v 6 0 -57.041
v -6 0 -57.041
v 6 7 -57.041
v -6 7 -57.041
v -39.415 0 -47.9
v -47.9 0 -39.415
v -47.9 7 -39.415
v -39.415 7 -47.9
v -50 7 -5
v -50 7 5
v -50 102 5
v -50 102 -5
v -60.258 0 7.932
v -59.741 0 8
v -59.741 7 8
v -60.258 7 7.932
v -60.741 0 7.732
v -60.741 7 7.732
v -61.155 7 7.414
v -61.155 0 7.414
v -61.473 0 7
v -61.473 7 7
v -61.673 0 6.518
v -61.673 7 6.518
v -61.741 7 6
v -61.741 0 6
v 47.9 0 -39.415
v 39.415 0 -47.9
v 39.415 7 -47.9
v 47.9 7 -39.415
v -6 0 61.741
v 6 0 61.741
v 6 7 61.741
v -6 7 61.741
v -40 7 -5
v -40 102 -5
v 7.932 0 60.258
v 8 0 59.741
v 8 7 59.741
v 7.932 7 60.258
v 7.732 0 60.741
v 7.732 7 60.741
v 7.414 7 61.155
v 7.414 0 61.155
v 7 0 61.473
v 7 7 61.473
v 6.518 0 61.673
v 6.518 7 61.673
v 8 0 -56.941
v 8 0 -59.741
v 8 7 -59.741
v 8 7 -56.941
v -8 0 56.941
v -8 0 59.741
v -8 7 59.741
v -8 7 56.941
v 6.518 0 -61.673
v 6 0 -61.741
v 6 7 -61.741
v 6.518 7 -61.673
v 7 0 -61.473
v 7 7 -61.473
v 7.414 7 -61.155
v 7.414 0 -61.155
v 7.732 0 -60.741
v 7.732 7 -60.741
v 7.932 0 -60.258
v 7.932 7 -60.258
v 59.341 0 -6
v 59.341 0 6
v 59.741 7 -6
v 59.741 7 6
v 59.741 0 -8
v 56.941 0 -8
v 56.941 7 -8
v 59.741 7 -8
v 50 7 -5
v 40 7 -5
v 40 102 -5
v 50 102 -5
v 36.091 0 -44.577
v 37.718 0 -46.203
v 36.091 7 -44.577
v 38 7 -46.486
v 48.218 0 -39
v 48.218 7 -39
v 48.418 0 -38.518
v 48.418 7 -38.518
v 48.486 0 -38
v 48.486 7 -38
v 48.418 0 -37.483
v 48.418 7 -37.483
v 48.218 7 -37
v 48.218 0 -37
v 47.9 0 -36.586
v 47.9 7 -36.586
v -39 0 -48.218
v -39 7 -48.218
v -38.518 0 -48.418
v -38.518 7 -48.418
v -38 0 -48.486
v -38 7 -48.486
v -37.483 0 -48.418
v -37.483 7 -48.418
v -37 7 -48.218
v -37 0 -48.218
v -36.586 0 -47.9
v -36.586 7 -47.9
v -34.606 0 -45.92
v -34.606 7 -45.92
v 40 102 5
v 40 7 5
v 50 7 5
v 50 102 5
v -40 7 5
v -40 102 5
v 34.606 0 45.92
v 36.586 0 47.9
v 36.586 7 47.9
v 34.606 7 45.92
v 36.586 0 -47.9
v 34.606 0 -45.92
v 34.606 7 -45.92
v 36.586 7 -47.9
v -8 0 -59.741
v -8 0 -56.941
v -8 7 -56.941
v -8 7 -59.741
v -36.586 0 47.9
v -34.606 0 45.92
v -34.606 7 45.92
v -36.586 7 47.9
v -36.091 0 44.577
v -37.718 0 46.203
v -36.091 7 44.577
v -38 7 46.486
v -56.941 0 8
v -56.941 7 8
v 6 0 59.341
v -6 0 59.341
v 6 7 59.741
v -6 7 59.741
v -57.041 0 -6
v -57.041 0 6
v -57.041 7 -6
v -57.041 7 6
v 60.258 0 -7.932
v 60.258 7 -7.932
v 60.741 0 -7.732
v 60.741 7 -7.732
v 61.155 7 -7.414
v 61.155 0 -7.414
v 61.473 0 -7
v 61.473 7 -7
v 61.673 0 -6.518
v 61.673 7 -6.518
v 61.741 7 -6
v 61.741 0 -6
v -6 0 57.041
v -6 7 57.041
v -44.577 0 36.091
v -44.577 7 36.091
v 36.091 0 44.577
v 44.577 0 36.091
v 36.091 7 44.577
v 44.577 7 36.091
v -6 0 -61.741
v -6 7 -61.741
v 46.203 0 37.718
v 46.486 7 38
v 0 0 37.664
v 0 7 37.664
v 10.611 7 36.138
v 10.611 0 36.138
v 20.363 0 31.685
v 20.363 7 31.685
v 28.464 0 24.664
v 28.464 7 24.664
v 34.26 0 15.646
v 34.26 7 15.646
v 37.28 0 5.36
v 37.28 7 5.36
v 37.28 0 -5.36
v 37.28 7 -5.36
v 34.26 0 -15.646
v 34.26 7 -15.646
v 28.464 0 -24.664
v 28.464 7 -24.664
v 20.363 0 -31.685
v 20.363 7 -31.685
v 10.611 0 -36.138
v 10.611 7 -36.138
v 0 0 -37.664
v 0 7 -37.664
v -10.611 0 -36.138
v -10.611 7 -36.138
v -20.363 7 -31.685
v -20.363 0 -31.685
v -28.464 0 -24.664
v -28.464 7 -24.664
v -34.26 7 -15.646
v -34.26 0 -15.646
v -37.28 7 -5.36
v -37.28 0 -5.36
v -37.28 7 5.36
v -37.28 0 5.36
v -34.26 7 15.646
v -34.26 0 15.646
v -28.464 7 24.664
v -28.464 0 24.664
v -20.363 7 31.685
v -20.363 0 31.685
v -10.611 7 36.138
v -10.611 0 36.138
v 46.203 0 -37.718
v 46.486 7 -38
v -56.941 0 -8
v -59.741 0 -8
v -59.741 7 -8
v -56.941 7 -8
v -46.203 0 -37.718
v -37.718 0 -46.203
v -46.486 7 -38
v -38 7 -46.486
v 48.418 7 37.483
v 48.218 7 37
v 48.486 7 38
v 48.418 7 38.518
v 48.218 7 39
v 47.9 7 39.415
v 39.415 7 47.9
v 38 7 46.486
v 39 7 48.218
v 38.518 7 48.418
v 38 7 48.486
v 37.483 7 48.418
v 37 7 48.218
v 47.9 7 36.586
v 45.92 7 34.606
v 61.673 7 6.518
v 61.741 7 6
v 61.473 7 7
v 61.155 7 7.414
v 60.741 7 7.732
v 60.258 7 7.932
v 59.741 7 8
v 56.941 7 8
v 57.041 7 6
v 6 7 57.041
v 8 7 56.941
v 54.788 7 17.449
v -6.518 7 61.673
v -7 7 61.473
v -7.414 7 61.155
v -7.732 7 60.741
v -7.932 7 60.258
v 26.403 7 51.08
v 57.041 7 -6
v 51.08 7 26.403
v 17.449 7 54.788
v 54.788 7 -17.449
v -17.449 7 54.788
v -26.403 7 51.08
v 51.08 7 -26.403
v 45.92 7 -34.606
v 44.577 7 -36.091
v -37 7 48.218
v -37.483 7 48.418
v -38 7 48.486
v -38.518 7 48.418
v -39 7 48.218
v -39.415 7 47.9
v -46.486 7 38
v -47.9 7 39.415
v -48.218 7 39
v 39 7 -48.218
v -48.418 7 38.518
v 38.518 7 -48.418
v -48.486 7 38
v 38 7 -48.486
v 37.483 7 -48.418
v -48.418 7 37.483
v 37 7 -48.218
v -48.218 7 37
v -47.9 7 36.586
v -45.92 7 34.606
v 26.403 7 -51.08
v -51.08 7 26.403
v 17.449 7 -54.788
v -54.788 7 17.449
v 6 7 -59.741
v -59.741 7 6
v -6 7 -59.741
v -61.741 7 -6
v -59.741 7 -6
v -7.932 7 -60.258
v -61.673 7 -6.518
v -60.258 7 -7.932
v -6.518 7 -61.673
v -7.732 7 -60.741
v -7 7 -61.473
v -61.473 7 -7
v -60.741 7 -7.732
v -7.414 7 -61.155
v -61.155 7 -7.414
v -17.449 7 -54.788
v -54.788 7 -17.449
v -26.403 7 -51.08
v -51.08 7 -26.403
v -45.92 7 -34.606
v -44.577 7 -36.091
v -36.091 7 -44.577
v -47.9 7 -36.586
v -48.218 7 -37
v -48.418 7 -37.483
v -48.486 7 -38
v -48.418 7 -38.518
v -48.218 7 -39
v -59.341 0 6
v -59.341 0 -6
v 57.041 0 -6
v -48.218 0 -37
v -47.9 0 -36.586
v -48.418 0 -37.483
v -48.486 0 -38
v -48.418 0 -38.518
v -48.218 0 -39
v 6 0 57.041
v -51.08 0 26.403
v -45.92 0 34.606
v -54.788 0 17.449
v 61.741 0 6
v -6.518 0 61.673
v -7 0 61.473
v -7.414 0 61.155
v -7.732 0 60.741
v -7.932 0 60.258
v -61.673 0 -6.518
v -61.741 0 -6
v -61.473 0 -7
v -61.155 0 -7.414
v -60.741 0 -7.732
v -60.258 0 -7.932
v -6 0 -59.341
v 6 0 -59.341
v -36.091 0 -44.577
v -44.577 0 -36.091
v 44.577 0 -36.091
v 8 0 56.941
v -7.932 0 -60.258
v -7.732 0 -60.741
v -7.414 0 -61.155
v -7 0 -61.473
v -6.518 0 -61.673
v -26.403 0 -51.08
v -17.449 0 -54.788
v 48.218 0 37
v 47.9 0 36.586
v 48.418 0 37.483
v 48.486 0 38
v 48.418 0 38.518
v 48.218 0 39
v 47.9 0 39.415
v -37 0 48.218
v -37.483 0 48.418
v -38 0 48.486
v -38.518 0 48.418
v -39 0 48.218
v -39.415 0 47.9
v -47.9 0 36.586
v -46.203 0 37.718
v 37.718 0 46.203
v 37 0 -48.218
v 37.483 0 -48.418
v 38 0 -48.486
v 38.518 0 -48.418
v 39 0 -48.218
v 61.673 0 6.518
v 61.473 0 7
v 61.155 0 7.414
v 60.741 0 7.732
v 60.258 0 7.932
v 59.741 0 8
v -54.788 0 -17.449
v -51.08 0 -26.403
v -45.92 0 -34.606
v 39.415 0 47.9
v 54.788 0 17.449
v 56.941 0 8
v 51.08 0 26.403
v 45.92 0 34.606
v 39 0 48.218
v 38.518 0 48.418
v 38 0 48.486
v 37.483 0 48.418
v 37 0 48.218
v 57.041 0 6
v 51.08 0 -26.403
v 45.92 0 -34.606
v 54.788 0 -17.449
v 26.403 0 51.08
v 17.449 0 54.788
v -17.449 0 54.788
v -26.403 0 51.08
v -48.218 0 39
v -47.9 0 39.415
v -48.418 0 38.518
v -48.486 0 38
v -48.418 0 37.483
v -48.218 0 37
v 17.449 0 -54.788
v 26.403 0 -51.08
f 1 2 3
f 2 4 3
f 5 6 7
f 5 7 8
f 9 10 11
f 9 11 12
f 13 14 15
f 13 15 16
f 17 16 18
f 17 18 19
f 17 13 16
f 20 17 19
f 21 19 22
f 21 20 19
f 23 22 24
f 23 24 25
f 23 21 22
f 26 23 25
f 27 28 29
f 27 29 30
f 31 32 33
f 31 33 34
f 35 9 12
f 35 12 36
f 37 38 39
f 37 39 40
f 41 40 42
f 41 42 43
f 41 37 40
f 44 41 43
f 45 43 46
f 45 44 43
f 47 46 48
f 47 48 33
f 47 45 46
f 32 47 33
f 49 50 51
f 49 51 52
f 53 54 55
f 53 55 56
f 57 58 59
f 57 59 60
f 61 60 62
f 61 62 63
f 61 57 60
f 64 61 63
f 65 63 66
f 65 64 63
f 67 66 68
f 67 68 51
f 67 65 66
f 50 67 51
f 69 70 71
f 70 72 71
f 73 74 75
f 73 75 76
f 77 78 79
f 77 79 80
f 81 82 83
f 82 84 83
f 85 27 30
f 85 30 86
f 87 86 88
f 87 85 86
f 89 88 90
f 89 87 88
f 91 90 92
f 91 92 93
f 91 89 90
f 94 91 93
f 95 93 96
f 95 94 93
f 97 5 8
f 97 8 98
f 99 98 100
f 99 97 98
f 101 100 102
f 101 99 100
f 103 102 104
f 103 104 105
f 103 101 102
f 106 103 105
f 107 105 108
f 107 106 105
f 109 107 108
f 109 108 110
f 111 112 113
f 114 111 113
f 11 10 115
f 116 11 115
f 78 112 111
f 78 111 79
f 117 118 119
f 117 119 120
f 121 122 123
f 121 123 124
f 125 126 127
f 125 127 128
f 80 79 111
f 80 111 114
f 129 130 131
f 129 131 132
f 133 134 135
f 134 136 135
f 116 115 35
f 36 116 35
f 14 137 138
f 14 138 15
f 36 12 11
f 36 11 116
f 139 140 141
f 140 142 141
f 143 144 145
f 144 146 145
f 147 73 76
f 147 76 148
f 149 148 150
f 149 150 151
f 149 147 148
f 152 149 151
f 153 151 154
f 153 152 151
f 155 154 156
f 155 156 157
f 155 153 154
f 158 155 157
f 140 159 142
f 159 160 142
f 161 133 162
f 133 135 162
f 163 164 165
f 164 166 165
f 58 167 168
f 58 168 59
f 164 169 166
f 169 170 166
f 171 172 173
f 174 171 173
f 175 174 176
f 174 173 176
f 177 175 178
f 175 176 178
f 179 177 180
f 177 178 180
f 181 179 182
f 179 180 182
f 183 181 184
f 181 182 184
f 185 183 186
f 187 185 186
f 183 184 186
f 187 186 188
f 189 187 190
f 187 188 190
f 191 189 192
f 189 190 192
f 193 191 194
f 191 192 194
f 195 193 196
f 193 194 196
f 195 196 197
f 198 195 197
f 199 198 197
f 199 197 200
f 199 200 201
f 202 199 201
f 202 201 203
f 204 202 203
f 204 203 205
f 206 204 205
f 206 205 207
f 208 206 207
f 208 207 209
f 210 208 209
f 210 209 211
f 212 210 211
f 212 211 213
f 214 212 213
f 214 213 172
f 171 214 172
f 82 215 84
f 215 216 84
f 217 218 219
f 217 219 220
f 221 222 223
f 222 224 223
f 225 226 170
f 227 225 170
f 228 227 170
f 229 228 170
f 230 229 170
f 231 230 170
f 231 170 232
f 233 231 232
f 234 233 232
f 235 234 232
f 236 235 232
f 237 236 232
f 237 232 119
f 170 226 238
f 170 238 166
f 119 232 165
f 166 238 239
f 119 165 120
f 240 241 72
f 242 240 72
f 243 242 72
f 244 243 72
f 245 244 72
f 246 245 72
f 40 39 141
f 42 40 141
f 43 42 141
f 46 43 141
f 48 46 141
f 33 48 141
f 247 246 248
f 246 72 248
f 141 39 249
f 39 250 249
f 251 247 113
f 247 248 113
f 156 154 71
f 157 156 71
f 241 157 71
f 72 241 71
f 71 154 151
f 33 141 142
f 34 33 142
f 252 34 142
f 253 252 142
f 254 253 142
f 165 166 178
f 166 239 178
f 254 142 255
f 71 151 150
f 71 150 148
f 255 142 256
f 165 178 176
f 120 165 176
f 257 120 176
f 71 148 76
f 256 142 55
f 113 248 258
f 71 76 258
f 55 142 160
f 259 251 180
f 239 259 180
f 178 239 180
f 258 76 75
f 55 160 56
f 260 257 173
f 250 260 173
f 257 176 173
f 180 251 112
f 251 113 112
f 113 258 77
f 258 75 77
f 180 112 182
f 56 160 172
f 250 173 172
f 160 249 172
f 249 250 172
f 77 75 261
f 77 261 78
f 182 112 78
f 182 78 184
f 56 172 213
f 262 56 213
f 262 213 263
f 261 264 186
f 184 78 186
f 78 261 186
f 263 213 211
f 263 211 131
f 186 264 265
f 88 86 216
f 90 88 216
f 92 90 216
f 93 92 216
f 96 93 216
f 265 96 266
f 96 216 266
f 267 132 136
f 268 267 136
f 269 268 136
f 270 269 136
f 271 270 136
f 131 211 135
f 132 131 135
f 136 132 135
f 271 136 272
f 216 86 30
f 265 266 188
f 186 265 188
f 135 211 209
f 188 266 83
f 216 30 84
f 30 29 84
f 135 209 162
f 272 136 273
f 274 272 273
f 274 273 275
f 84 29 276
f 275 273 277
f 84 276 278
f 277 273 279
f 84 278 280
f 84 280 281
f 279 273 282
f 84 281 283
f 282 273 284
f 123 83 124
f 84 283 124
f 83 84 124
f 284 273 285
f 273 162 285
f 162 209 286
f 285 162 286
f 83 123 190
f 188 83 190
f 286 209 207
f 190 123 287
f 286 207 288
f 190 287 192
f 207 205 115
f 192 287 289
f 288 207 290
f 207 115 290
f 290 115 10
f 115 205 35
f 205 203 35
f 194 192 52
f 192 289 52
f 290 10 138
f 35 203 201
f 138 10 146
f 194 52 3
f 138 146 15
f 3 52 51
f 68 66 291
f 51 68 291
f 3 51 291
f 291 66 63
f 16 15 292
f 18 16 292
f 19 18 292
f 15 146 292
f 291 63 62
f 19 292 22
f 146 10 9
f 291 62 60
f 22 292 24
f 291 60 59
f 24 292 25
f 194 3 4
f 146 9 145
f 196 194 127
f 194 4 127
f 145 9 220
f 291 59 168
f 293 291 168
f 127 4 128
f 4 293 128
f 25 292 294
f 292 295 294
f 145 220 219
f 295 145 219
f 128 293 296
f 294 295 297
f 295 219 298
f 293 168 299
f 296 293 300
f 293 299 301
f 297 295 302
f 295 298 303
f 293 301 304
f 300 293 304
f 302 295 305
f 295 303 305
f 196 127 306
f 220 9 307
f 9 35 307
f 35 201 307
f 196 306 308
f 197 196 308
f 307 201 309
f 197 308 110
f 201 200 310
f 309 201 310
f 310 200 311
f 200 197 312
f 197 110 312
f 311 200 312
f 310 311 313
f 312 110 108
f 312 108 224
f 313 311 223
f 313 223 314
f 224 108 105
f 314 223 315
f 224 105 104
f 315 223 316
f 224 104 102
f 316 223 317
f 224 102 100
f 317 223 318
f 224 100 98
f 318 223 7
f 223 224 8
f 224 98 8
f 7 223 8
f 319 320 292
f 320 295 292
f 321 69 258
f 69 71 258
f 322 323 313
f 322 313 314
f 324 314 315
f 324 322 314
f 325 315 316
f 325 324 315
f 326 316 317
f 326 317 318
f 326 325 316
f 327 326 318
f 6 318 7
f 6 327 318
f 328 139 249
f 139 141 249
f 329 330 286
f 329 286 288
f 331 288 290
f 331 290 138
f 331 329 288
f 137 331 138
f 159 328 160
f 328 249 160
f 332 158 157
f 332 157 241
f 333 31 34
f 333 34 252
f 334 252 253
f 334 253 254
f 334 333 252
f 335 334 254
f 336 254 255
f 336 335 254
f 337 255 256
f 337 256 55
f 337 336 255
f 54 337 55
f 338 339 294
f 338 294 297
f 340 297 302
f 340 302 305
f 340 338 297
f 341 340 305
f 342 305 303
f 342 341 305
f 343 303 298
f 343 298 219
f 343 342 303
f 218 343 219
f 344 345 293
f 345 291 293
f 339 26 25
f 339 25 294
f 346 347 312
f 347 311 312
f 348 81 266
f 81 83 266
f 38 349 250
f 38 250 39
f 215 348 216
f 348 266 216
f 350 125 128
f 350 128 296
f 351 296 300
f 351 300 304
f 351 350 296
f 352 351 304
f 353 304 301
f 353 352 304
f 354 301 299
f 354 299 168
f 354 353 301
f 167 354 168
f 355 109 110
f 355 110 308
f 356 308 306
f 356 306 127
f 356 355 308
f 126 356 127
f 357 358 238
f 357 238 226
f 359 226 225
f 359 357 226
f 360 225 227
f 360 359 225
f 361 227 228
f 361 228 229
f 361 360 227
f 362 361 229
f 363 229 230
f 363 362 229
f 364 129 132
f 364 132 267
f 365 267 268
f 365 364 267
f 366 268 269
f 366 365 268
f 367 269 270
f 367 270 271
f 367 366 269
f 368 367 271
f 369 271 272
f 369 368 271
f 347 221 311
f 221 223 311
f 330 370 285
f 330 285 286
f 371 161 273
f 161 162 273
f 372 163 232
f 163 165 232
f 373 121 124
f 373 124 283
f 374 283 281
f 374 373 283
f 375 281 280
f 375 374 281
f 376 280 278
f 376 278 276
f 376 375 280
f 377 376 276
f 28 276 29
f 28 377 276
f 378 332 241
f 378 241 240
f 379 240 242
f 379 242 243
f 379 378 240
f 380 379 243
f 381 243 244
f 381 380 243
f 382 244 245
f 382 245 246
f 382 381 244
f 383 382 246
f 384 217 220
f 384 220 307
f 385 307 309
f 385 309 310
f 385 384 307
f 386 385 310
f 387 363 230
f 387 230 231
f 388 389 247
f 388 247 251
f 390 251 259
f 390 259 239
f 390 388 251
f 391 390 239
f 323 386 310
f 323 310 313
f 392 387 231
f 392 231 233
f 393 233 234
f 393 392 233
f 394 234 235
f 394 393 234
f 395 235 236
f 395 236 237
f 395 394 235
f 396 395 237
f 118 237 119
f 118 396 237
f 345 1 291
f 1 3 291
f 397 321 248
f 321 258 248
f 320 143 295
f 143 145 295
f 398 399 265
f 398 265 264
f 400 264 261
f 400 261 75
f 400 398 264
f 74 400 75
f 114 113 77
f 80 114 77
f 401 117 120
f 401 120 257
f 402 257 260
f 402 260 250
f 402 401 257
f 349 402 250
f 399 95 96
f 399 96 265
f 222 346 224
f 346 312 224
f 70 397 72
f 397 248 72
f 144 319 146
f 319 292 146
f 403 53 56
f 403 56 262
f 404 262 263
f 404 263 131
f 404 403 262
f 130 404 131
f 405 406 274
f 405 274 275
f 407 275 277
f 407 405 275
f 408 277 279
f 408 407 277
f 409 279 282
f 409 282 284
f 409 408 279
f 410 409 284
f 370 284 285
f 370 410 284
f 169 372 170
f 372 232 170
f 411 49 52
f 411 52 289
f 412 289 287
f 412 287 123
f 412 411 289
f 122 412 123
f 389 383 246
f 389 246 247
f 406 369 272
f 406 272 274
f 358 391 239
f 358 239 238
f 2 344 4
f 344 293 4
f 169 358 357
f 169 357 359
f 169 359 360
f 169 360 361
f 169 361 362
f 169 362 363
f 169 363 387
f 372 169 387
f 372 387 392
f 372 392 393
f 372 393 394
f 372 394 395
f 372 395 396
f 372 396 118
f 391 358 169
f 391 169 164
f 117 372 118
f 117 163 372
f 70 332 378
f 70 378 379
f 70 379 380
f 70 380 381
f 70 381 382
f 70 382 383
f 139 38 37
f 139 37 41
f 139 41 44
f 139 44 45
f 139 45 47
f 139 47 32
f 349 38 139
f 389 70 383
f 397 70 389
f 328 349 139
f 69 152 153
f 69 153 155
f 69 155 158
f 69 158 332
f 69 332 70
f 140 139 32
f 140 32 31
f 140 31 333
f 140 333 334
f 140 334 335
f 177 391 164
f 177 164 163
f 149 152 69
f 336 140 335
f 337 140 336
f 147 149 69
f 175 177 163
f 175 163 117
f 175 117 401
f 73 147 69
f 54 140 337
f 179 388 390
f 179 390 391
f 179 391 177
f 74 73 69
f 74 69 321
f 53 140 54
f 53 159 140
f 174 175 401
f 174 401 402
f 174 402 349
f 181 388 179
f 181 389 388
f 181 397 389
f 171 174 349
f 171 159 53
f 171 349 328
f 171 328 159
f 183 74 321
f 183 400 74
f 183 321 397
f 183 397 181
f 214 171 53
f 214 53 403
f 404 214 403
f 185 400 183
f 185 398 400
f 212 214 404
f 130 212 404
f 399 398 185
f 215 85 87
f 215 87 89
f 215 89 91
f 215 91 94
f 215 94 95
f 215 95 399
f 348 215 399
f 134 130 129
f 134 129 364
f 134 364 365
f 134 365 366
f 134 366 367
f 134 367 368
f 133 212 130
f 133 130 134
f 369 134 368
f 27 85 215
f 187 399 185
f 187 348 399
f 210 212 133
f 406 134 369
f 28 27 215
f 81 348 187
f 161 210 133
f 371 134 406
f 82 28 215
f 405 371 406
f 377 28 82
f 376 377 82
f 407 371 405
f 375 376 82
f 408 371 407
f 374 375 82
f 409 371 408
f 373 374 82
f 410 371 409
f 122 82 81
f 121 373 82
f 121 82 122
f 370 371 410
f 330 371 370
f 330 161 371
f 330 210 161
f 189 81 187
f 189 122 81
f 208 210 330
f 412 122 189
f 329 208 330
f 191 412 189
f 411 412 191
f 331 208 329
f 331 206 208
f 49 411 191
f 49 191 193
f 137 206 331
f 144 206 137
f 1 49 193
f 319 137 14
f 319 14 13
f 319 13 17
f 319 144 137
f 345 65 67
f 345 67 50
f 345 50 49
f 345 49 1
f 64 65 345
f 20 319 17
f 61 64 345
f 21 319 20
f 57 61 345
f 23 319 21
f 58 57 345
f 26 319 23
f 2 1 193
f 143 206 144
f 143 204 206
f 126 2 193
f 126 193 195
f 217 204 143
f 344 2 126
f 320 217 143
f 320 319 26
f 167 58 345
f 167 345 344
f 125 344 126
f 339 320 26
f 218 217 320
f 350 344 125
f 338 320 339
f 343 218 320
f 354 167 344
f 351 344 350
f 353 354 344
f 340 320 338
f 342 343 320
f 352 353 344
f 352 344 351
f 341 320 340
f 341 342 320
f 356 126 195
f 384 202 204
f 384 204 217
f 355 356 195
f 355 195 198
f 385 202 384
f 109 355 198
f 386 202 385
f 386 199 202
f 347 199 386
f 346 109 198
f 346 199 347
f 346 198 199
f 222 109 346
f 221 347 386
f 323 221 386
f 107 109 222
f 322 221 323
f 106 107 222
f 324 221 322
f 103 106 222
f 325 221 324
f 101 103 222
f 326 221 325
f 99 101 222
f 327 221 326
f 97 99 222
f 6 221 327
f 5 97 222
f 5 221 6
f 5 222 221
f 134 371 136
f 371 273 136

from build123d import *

# Parameters (mm, degrees)
BOSS_EXTRUDE1_DEPTH = 7
SKETCH2_W           = 10
SKETCH2_H           = 10
BOSS_EXTRUDE2_DEPTH = 95
SKETCH3_R           = 37.663730654
CUT_EXTRUDE1_DEPTH  = 130.030393965
CIRPATTERN1_COUNT   = 8


with BuildPart() as part:
    # Sketch1 → Boss-Extrude1 (new body)
    with BuildSketch(Plane(origin=(0, 0, 0), x_dir=(1, 0, 0), z_dir=(0, 1, 0))):
        with BuildLine():
            Line((-8, 56.940758688), (-8, 59.740758688))
            ThreePointArc((-8, 59.740758688), (-7.414213562, 61.154972251), (-6, 61.740758688))
            Line((-6, 61.740758688), (6, 61.740758688))
            ThreePointArc((6, 61.740758688), (7.414213562, 61.154972251), (8, 59.740758688))
            Line((8, 59.740758688), (8, 56.940758688))
            ThreePointArc((8, 56.940758688), (22.004297361, 53.123073119), (34.606342345, 45.920050844))
            Line((34.606342345, 45.920050844), (36.586241332, 47.899949831))
            ThreePointArc((36.586241332, 47.899949831), (38.000454895, 48.485736269), (39.414668457, 47.899949831))
            Line((39.414668457, 47.899949831), (47.899949831, 39.414668457))
            ThreePointArc((47.899949831, 39.414668457), (48.485736269, 38.000454895), (47.899949831, 36.586241332))
            Line((47.899949831, 36.586241332), (45.920050844, 34.606342345))
            ThreePointArc((45.920050844, 34.606342345), (53.123073119, 22.004297361), (56.940758688, 8))
            Line((56.940758688, 8), (59.740758688, 8))
            ThreePointArc((59.740758688, 8), (61.154972251, 7.414213562), (61.740758688, 6))
            Line((61.740758688, 6), (61.740758688, -6))
            ThreePointArc((61.740758688, -6), (61.154972251, -7.414213562), (59.740758688, -8))
            Line((59.740758688, -8), (56.940758688, -8))
            ThreePointArc((56.940758688, -8), (53.123073119, -22.004297361), (45.920050844, -34.606342345))
            Line((45.920050844, -34.606342345), (47.899949831, -36.586241332))
            ThreePointArc((47.899949831, -36.586241332), (48.485736269, -38.000454895), (47.899949831, -39.414668457))
            Line((47.899949831, -39.414668457), (39.414668457, -47.899949831))
            ThreePointArc((39.414668457, -47.899949831), (38.000454895, -48.485736269), (36.586241332, -47.899949831))
            Line((36.586241332, -47.899949831), (34.606342345, -45.920050844))
            ThreePointArc((34.606342345, -45.920050844), (22.004297361, -53.123073119), (8, -56.940758688))
            Line((8, -56.940758688), (8, -59.740758688))
            ThreePointArc((8, -59.740758688), (7.414213562, -61.154972251), (6, -61.740758688))
            Line((6, -61.740758688), (-6, -61.740758688))
            ThreePointArc((-6, -61.740758688), (-7.414213562, -61.154972251), (-8, -59.740758688))
            Line((-8, -59.740758688), (-8, -56.940758688))
            ThreePointArc((-8, -56.940758688), (-22.004297361, -53.123073119), (-34.606342345, -45.920050844))
            Line((-34.606342345, -45.920050844), (-36.586241332, -47.899949831))
            ThreePointArc((-36.586241332, -47.899949831), (-38.000454895, -48.485736269), (-39.414668457, -47.899949831))
            Line((-39.414668457, -47.899949831), (-47.899949831, -39.414668457))
            ThreePointArc((-47.899949831, -39.414668457), (-48.485736269, -38.000454895), (-47.899949831, -36.586241332))
            Line((-47.899949831, -36.586241332), (-45.920050844, -34.606342345))
            ThreePointArc((-45.920050844, -34.606342345), (-53.123073119, -22.004297361), (-56.940758688, -8))
            Line((-56.940758688, -8), (-59.740758688, -8))
            ThreePointArc((-59.740758688, -8), (-61.154972251, -7.414213562), (-61.740758688, -6))
            Line((-61.740758688, -6), (-61.740758688, 6))
            ThreePointArc((-61.740758688, 6), (-61.154972251, 7.414213562), (-59.740758688, 8))
            Line((-59.740758688, 8), (-56.940758688, 8))
            ThreePointArc((-56.940758688, 8), (-53.123073119, 22.004297361), (-45.920050844, 34.606342345))
            Line((-45.920050844, 34.606342345), (-47.899949831, 36.586241332))
            ThreePointArc((-47.899949831, 36.586241332), (-48.485736269, 38.000454895), (-47.899949831, 39.414668457))
            Line((-47.899949831, 39.414668457), (-39.414668457, 47.899949831))
            ThreePointArc((-39.414668457, 47.899949831), (-38.000454895, 48.485736269), (-36.586241332, 47.899949831))
            Line((-36.586241332, 47.899949831), (-34.606342345, 45.920050844))
            ThreePointArc((-34.606342345, 45.920050844), (-22.004297361, 53.123073119), (-8, 56.940758688))
        make_face()
    extrude(amount=BOSS_EXTRUDE1_DEPTH)

    # Sketch2 → Boss-Extrude2 (add)
    with BuildSketch(Plane(origin=(0, 7, 0), x_dir=(1, 0, 0), z_dir=(0, 1, 0))):
        with Locations((45, 0)):
            Rectangle(SKETCH2_W, SKETCH2_H)
        with Locations((-45, 0)):
            Rectangle(SKETCH2_W, SKETCH2_H)
    extrude(amount=BOSS_EXTRUDE2_DEPTH)

    # Sketch3 → Cut-Extrude1 (cut, through all)
    with BuildSketch(Plane(origin=(0, 7, 0), x_dir=(1, 0, 0), z_dir=(0, 1, 0))):
        with Locations(Location((0, 0, 0), (0, 0, 270))):
            Circle(SKETCH3_R)
    extrude(amount=-CUT_EXTRUDE1_DEPTH, mode=Mode.SUBTRACT)

    # Sketch7 → Cut-Loft1 section 0
    with BuildSketch(Plane.XZ):
        with BuildLine():
            Line((-6, -57.040758688), (6, -57.040758688))
            Line((6, -57.040758688), (6, -59.340758688))
            Line((6, -59.340758688), (-6, -59.340758688))
            Line((-6, -59.340758688), (-6, -57.040758688))
        make_face()
    # Sketch5 → Cut-Loft1 section 1
    with BuildSketch(Plane(origin=(0, 7, 0), x_dir=(1, 0, 0), z_dir=(0, 1, 0))):
        with BuildLine():
            Line((-6, 59.740758688), (6, 59.740758688))
            Line((6, 59.740758688), (6, 57.040758688))
            Line((6, 57.040758688), (-6, 57.040758688))
            Line((-6, 57.040758688), (-6, 59.740758688))
        make_face()
    cut_loft1 = loft(mode=Mode.SUBTRACT)

    # CirPattern1: Cut-Loft1 ×8 about axis
    cirpattern1_axis = Axis((0, 0, 0), (0, 1, 0))
    for i in range(1, CIRPATTERN1_COUNT):
        add(cut_loft1.rotate(cirpattern1_axis, i * 360 / CIRPATTERN1_COUNT), mode=Mode.SUBTRACT)


solid = part.part
